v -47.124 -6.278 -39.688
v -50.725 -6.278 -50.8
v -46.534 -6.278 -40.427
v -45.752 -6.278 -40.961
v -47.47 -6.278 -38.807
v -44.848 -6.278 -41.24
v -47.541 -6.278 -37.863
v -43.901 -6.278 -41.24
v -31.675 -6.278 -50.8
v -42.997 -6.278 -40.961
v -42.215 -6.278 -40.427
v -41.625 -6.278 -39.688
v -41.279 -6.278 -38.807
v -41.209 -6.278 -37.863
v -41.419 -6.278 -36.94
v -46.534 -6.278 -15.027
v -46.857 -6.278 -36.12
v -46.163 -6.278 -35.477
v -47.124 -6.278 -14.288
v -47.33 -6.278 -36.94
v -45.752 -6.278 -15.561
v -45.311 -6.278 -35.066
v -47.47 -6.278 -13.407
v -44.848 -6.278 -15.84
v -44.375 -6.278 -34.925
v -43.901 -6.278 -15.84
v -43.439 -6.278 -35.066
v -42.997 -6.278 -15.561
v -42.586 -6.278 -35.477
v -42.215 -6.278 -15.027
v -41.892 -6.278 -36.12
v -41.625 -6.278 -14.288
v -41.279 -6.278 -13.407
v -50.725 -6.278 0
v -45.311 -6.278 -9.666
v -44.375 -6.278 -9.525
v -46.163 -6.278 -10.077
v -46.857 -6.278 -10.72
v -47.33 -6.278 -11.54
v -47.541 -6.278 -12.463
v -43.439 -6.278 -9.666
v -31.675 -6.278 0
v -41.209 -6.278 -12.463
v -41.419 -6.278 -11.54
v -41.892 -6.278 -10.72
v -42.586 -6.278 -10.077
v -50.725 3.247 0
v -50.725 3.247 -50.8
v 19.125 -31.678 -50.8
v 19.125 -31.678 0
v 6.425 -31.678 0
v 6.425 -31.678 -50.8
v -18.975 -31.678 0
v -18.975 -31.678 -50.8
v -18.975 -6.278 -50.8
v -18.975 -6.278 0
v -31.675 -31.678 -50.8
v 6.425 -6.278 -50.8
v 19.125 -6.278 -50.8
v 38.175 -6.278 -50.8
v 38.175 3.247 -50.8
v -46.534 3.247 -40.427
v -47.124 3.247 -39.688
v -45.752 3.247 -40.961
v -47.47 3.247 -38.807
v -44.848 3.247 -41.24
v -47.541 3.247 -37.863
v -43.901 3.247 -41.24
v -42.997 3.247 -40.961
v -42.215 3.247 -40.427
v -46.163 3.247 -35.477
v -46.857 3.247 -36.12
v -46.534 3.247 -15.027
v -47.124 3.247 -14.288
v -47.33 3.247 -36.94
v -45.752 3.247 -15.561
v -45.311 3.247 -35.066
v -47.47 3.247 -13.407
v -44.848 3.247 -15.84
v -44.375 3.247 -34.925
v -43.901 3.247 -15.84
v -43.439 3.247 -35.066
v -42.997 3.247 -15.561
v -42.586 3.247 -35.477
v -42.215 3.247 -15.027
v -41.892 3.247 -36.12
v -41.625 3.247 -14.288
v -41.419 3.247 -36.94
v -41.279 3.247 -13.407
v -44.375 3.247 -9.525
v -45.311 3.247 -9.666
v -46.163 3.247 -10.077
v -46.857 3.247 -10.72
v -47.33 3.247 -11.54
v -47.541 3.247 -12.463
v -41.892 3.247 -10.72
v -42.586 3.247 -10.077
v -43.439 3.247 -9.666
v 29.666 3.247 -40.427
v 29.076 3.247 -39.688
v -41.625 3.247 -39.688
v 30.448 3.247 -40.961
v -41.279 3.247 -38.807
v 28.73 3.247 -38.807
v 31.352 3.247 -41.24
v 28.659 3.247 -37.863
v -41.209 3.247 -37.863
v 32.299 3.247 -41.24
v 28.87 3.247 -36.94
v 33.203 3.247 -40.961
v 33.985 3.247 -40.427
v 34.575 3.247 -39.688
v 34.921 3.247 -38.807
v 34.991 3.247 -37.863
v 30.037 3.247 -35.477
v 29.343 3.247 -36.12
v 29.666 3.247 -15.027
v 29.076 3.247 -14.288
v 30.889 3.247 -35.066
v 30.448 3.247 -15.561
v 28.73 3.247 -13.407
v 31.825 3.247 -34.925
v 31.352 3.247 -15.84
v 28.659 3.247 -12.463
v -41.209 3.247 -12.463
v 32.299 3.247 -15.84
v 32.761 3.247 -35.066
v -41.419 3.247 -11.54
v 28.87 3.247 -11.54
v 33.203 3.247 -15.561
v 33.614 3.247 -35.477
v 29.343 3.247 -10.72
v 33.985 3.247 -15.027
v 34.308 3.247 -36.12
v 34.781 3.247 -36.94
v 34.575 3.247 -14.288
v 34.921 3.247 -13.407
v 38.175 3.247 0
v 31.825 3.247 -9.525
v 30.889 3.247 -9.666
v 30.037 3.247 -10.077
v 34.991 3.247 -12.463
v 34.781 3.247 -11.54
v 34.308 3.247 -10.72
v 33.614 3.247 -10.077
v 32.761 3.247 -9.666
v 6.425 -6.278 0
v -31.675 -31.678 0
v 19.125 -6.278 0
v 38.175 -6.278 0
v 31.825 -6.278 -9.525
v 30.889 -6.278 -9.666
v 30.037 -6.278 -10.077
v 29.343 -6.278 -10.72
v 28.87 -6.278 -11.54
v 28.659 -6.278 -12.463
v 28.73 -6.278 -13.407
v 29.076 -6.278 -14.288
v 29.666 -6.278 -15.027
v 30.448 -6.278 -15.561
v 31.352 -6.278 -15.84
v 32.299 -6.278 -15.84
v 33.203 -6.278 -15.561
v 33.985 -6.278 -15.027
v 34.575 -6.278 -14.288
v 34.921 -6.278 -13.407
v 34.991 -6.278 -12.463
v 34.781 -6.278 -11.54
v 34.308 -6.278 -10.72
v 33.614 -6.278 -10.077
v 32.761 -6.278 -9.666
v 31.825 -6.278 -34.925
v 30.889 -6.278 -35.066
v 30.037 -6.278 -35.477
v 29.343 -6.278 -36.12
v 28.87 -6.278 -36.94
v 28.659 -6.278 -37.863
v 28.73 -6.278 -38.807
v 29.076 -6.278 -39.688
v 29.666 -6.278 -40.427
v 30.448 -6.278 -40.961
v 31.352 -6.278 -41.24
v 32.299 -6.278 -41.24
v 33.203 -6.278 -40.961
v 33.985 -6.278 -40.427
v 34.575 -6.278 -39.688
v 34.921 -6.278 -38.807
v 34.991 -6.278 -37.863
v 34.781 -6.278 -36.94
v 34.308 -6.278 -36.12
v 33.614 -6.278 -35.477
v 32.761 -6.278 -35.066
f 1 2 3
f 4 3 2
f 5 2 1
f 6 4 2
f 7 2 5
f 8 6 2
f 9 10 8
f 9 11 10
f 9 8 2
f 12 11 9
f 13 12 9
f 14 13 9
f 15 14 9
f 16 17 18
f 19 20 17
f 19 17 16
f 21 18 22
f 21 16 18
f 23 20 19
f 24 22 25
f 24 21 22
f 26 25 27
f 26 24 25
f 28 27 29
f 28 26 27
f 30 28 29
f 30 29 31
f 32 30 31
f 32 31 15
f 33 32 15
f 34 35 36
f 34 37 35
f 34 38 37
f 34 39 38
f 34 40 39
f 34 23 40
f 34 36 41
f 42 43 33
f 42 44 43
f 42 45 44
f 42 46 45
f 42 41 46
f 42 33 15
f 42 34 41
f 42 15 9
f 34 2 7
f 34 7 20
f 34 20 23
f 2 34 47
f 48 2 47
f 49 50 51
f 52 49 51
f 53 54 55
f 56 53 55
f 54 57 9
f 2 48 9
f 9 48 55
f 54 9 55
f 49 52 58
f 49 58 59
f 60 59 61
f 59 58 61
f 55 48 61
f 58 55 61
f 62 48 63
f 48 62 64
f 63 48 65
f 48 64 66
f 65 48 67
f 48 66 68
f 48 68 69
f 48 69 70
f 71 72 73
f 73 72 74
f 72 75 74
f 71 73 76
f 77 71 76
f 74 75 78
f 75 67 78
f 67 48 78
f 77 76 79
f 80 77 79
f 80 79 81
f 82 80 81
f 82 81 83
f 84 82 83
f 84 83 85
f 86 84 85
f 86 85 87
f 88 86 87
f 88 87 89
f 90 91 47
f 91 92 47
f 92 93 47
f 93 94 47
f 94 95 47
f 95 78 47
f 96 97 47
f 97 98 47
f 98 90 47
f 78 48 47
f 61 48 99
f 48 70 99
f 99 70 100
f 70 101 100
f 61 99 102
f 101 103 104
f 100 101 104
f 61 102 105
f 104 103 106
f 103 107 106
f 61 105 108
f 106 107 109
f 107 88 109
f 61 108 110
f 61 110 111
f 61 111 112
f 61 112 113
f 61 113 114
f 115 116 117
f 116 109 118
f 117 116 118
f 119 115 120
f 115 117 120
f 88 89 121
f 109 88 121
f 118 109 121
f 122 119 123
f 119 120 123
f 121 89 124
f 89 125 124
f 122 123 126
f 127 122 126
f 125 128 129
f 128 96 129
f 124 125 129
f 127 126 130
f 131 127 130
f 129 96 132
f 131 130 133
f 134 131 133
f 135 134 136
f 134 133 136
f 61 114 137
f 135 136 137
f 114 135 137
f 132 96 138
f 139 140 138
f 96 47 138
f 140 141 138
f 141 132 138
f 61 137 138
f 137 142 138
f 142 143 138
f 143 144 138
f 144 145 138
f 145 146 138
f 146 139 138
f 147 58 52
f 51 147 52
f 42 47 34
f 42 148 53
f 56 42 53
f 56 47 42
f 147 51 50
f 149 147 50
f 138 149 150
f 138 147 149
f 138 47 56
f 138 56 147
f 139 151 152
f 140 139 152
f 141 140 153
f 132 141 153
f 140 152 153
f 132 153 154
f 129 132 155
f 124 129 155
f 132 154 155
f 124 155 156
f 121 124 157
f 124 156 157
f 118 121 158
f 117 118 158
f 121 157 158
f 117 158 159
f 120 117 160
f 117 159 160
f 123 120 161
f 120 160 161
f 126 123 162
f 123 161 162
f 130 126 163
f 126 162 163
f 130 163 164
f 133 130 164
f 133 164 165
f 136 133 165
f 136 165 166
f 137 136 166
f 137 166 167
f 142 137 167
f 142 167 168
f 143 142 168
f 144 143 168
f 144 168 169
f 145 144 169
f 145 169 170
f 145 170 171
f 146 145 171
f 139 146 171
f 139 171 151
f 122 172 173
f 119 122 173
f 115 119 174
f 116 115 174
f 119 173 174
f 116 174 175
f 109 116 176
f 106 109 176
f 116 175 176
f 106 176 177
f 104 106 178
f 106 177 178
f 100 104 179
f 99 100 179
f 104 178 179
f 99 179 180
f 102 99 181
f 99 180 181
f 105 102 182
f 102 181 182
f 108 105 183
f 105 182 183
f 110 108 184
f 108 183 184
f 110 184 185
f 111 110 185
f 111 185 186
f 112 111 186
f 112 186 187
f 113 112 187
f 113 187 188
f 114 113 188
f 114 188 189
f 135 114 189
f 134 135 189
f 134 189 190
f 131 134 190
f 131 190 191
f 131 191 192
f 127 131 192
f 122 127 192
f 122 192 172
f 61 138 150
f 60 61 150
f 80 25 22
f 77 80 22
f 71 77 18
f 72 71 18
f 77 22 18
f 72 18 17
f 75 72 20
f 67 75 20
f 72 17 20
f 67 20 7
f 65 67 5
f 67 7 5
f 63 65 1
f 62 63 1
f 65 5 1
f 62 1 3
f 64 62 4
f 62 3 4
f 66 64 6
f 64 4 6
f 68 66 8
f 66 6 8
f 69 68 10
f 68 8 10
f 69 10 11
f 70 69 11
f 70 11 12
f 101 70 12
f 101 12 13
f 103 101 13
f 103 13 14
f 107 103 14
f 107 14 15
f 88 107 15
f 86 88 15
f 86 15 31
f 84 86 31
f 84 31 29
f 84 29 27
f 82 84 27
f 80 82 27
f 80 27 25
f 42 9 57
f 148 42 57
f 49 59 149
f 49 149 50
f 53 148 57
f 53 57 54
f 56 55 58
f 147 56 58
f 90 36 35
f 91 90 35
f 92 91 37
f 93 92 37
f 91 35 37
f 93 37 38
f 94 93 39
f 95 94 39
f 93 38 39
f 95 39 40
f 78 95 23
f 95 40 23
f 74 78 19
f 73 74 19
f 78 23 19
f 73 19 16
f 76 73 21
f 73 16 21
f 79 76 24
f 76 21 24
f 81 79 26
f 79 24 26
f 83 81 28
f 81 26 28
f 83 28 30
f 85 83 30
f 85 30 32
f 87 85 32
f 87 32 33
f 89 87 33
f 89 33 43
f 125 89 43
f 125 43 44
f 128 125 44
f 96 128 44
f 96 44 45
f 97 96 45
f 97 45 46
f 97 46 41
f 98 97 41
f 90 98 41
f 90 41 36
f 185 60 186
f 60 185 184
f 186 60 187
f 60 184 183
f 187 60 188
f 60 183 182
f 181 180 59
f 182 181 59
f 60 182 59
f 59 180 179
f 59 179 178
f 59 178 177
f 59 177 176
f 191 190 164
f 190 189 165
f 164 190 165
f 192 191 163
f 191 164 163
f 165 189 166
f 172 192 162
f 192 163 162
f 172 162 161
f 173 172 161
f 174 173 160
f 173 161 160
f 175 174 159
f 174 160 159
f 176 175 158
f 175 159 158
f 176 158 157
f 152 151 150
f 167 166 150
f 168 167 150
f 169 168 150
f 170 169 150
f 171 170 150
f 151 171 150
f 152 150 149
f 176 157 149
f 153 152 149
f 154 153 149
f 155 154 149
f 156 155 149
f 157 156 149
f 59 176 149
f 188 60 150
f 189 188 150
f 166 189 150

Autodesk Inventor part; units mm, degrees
ref_plane "YZ Plane" through (0, 0, 0) normal (1, 0, 0) x (0, 1, 0)
ref_plane "XZ Plane" through (0, 0, 0) normal (0, 1, 0) x (-1, 0, 0)
ref_plane "XY Plane" through (0, 0, 0) normal (0, 0, 1) x (1, 0, 0)
sketch "Sketch1" plane through (0, 0, 0) normal (0, 0, 1) x (1, 0, 0)
  line L0 (-50.7247, 3.2468) -> (38.1753, 3.2468)
  line L1 (38.1753, 3.2468) -> (38.1753, -6.2782)
  line L2 (-50.7247, -6.2782) -> (-50.7247, 3.2468)
  line L3 (38.1753, -6.2782) -> (19.1253, -6.2782)
  line L4 (-50.7247, -6.2782) -> (-31.6747, -6.2782)
  line L5 (-31.6747, -6.2782) -> (-31.6747, -31.6782)
  line L6 (19.1253, -6.2782) -> (19.1253, -31.6782)
  line L7 (19.1253, -31.6782) -> (6.4253, -31.6782)
  line L8 (-31.6747, -31.6782) -> (-18.9747, -31.6782)
  line L9 (-18.9747, -31.6782) -> (-18.9747, -6.2782)
  line L10 (-18.9747, -6.2782) -> (6.4253, -6.2782)
  line L11 (6.4253, -6.2782) -> (6.4253, -31.6782)
  point P0 (0, 0)
  dimension "d0" = 88.9
  dimension "d1" = 9.525
  dimension "d2" = 19.05
  dimension "d3" = 19.05
  dimension "d4" = 25.4
  dimension "d5" = 12.7
  dimension "d6" = 12.7
extrude "Extrusion1" add sketch "Sketch1" against normal blind 50.8
sketch "Sketch2" plane through (-50.7247, 3.2468, 0) normal (0, 1, 0) x (1, 0, 0)
  line L0 (88.9, 50.8) -> (0, 50.8) projected
  line L1 (0, 0) -> (88.9, 0) projected
  line L2 (88.9, 0) -> (88.9, 50.8) projected
  line L3 (44.45, 0) -> (44.45, 50.8)
  point P0 (50.7247, 0)
  point P1 (82.55, 12.7)
  point P2 (82.55, 38.1)
  point P3 (6.35, 38.1)
  point P4 (6.35, 12.7)
  dimension "d9" = 44.45
  dimension "d10" = 38.1
  dimension "d11" = 38.1
  dimension "d12" = 38.1
  dimension "d13" = 38.1
  dimension "d14" = 25.4
  dimension "d15" = 25.4
  dimension "d16" = 12.7
  dimension "d17" = 12.7
hole "Hole1" at (31.8253, 3.2468, -12.7) at (31.8253, 3.2468, -38.1) at (-44.3747, 3.2468, -38.1) at (-44.3747, 3.2468, -12.7) direction (0, -1, 0) diameter 6.35 depth 25.4 tip angle 118
properties part number "8020_sliders"
